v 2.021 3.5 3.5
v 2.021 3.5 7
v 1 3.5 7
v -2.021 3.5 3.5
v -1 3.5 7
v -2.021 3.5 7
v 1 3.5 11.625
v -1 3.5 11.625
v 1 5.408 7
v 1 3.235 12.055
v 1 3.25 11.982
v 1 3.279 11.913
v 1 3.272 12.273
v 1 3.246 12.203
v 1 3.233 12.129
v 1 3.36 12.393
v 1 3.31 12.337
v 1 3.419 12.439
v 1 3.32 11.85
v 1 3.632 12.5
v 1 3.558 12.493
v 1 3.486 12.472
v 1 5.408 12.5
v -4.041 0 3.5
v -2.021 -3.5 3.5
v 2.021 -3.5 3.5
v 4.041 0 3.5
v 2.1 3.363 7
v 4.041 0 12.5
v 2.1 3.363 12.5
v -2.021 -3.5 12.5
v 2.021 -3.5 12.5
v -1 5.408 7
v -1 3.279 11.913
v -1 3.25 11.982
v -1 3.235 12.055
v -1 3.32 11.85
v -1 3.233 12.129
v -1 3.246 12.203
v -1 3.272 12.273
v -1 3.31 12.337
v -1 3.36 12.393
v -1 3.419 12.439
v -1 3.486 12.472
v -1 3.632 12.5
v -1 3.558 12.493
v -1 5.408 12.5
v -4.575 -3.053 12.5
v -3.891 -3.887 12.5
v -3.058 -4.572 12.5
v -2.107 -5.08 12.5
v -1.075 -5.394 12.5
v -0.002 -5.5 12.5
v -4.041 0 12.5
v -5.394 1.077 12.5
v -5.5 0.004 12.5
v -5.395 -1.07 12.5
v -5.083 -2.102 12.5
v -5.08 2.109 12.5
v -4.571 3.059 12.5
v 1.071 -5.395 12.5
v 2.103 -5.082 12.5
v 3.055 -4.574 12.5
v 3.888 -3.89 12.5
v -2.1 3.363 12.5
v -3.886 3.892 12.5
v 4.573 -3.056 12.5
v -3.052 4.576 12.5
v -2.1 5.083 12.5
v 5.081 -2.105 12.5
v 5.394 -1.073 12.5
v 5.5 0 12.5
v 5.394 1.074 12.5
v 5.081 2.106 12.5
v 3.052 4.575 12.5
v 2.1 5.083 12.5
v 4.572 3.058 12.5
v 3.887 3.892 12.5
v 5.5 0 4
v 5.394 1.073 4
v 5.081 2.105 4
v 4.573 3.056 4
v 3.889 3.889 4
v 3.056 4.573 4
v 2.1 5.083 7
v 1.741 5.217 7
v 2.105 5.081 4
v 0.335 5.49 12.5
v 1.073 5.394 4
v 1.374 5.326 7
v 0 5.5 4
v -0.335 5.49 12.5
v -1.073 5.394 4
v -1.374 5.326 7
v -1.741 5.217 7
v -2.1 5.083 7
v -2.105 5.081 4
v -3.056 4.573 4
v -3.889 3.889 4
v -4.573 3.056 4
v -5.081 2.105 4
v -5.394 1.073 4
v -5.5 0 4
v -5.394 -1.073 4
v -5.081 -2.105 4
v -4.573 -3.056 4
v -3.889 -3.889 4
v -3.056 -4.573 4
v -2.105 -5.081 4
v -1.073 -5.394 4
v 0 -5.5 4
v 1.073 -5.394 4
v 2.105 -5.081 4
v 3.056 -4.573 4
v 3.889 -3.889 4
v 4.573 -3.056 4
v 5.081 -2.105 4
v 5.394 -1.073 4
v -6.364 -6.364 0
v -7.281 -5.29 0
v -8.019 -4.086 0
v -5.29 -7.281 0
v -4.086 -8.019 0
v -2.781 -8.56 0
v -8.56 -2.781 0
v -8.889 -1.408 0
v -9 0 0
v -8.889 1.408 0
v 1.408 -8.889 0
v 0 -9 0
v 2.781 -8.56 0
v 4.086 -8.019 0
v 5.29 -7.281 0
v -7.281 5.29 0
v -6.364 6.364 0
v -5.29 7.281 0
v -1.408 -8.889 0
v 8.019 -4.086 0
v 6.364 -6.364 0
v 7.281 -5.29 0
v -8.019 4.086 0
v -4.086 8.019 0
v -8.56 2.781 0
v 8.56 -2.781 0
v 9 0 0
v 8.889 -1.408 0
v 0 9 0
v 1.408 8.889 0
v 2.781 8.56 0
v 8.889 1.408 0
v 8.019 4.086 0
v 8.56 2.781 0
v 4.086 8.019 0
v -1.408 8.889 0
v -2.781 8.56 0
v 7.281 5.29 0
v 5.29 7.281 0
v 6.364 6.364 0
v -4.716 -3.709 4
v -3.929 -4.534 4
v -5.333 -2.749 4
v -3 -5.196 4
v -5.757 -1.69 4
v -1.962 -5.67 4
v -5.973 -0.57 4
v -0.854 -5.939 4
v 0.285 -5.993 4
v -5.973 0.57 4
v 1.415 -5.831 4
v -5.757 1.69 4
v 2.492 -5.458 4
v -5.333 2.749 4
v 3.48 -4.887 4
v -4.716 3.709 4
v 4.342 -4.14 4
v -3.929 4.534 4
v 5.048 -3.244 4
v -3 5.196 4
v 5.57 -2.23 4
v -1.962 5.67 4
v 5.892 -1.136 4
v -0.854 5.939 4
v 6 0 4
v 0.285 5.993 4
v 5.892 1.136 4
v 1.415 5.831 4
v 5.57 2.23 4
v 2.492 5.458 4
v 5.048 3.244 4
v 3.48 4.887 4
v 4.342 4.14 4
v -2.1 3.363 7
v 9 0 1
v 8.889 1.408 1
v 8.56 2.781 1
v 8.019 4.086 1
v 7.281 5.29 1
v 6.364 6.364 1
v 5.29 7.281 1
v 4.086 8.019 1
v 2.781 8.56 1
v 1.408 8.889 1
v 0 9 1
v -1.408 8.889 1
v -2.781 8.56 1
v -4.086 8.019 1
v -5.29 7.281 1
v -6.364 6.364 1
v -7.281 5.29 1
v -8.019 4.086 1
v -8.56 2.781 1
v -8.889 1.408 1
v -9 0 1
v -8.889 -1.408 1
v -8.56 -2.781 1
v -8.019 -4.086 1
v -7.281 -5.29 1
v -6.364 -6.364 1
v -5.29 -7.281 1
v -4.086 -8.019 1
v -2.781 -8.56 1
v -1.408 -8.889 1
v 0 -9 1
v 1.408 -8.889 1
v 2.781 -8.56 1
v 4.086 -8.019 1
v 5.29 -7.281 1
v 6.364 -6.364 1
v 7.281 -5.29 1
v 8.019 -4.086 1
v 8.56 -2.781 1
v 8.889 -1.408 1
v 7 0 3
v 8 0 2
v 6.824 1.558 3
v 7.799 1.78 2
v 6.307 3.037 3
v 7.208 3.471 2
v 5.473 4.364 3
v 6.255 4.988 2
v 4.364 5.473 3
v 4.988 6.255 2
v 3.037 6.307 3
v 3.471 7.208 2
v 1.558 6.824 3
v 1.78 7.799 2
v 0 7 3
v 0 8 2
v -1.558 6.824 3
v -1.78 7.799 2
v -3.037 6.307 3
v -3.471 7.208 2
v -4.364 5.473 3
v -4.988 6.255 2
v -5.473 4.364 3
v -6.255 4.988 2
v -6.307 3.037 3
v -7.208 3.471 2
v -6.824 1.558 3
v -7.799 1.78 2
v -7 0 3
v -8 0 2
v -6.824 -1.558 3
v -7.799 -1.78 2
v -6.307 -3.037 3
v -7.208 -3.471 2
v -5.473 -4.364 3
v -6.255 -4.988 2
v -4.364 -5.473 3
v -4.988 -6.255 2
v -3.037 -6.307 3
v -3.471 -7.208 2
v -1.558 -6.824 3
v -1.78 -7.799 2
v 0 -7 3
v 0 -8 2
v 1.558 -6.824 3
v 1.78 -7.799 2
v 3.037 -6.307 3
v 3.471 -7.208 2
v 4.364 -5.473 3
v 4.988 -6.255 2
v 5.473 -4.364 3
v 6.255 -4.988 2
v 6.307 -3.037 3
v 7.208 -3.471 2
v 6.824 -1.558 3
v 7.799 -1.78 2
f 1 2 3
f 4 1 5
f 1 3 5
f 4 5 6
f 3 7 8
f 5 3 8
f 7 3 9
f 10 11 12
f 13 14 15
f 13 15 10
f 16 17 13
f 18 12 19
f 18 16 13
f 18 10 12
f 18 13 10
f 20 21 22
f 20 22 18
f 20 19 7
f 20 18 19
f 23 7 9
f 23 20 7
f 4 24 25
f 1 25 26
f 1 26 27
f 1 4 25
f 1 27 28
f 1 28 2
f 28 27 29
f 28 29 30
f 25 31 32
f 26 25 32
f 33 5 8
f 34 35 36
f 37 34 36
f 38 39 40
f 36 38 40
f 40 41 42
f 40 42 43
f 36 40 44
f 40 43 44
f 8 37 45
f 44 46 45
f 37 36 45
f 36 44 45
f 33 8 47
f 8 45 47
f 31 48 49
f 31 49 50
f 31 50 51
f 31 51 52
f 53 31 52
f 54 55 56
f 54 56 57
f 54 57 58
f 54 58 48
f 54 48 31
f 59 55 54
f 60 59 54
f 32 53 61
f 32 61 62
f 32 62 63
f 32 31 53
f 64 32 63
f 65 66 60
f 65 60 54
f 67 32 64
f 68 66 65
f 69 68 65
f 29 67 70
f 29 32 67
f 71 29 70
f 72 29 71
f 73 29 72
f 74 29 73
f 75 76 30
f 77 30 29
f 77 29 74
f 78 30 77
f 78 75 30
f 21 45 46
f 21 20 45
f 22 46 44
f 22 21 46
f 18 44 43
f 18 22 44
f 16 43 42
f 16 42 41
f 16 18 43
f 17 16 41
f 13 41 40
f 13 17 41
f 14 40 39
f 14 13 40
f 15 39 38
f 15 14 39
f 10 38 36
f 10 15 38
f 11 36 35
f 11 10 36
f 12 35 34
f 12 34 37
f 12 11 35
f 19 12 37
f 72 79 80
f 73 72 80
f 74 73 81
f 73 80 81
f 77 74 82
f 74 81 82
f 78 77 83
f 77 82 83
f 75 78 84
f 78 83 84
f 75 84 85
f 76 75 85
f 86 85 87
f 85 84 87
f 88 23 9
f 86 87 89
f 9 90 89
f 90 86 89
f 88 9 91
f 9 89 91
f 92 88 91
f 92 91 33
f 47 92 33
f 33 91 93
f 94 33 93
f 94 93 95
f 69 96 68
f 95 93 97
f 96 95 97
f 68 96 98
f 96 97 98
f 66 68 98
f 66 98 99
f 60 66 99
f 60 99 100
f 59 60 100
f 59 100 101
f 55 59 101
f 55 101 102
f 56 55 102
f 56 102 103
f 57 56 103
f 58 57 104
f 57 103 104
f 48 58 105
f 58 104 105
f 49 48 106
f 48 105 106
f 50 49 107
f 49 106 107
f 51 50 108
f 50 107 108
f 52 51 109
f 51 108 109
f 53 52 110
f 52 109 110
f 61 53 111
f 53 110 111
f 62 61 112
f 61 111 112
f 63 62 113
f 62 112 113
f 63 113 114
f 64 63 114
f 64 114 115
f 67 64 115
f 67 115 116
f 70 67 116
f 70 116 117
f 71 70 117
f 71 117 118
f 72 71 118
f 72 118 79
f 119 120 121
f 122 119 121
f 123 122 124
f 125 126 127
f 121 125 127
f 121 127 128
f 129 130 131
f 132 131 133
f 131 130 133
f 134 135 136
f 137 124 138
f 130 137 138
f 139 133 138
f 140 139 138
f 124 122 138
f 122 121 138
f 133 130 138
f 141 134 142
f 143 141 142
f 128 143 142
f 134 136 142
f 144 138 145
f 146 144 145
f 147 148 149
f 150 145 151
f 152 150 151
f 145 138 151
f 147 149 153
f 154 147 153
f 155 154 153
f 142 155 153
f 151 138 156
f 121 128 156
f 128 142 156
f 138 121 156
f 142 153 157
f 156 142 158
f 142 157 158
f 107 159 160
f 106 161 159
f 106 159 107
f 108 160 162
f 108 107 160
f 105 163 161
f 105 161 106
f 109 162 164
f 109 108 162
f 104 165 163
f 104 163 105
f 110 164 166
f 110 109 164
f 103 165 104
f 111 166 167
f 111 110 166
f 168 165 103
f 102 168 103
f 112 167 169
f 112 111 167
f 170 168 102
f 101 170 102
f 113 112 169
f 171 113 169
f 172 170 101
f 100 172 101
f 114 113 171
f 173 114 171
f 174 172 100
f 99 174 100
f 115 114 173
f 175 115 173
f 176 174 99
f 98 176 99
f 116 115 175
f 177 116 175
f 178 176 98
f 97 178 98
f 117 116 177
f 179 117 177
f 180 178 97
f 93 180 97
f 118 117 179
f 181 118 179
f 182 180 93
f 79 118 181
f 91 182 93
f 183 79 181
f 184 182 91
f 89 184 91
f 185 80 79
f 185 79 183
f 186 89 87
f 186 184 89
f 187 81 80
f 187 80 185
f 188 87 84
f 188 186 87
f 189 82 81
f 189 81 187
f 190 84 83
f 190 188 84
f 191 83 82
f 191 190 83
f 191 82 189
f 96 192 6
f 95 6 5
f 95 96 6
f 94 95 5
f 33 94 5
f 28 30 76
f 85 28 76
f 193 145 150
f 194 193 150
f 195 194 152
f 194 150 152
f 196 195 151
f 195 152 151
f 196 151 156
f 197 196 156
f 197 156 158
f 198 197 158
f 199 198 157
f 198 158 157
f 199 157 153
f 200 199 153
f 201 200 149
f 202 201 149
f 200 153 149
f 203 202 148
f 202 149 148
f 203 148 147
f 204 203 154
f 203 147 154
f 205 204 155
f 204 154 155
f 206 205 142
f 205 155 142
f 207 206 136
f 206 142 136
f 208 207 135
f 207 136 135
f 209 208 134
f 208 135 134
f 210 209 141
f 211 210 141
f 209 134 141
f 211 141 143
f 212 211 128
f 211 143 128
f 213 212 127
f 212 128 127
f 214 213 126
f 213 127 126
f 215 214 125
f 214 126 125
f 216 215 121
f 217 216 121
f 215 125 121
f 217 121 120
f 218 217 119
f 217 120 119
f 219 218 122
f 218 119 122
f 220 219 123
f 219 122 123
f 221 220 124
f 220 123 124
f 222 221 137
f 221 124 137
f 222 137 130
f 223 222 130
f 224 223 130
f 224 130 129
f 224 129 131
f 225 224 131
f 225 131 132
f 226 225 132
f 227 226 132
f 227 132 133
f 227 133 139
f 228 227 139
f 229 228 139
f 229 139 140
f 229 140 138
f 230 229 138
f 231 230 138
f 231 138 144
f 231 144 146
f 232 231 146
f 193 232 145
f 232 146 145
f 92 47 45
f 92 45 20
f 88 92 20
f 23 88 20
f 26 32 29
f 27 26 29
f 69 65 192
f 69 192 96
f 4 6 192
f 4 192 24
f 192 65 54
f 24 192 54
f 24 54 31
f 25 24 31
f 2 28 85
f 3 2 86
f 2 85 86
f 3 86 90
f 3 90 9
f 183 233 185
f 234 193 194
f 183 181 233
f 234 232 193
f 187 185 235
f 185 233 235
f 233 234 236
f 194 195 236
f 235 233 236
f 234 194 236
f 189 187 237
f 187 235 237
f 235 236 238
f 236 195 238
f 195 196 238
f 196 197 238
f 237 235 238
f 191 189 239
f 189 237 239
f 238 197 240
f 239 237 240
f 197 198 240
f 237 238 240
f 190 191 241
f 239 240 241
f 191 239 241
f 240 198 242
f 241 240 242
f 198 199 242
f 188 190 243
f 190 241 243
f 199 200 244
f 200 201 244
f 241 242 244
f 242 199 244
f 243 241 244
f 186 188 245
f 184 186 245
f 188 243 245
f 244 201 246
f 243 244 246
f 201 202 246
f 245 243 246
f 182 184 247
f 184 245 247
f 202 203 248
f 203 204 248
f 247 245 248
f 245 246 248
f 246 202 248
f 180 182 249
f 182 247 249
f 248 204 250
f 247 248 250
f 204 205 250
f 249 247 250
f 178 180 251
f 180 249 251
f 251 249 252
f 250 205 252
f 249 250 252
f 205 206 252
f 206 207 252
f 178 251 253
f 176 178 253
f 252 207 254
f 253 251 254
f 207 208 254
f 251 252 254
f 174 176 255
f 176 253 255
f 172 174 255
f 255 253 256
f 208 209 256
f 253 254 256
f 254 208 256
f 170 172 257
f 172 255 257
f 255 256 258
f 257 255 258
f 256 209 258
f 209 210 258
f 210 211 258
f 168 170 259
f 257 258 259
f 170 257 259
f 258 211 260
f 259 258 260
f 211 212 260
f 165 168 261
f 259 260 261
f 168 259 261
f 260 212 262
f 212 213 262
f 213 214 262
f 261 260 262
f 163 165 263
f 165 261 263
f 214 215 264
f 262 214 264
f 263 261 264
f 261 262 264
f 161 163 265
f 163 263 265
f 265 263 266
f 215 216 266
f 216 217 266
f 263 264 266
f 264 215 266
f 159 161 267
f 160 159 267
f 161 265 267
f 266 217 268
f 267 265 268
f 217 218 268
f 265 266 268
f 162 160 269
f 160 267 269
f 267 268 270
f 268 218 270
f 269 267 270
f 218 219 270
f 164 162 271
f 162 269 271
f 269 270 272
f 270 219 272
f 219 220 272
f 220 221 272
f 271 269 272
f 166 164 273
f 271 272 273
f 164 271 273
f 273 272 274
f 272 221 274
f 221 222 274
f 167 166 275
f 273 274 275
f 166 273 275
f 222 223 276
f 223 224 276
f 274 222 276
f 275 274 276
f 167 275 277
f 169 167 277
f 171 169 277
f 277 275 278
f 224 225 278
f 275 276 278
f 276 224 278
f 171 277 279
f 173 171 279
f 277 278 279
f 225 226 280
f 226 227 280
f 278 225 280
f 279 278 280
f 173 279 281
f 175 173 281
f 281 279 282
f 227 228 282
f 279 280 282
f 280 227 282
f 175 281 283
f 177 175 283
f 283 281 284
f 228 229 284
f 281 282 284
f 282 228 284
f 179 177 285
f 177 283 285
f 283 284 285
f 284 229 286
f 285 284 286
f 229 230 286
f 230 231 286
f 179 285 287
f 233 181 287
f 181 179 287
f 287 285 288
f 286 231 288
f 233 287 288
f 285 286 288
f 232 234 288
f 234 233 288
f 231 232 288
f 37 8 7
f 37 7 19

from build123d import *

# Parameters (mm, degrees)
SKETCH_R          = 9
PAD_DEPTH         = 4
SKETCH001_R       = 5.5
PAD001_DEPTH      = 8.5
POCKET_DEPTH      = 9
SKETCH003_W       = 1.1
SKETCH003_H       = 4.61522
POCKET001_DEPTH   = 5.5
PAD002_DEPTH      = 1
PAD002_DEPTH_BACK = 1
FILLET_R          = 0.4
CHAMFER_SIZE      = 3


with BuildPart() as part:
    # Sketch (on XY_Plane of Origin) → Pad (new body)
    with BuildSketch(Plane.XY):
        Circle(SKETCH_R)
    extrude(amount=PAD_DEPTH)

    # Sketch001 (on Face3 of Pad) → Pad001 (join)
    with BuildSketch(Plane.XY.offset(4)):
        Circle(SKETCH001_R)
    extrude(amount=PAD001_DEPTH)

    # Sketch002 (on Face5 of Pad001) → Pocket (cut)
    with BuildSketch(Plane.XY.offset(12.5)):
        Polygon((2.020726, 3.5), (-2.020726, 3.5), (-4.041452, 0), (-2.020726, -3.5), (2.020726, -3.5), (4.041452, 0), align=None)
    extrude(amount=-POCKET_DEPTH, mode=Mode.SUBTRACT)

    # Sketch003 (on Face5 of Pocket) → Pocket001 (cut)
    with BuildSketch(Plane.XY.offset(12.5)):
        with Locations((-1.55, 4.391028)):
            Rectangle(SKETCH003_W, SKETCH003_H)
    pocket001 = extrude(amount=-POCKET001_DEPTH, mode=Mode.SUBTRACT)

    # Mirrored: Pocket001 across Sketch003 V_Axis
    add(pocket001.mirror(Plane(origin=(0, 0, 12.5), x_dir=(0, 0, 1), z_dir=(1, 0, 0))), mode=Mode.SUBTRACT)

    # Sketch004 (on YZ_Plane of Origin) → Pad002 (join, two sides)
    with BuildSketch(Plane.YZ) as pad002_sk:
        Polygon((3.6, 12.5), (3.6, 11.5), (2.8, 12.5), align=None)
    extrude(amount=PAD002_DEPTH)
    extrude(pad002_sk.sketch, amount=-PAD002_DEPTH_BACK)

    # Fillet
    fillet_edges = [part.edges().sort_by_distance(p)[0] for p in [
        (0, 2.8, 12.5),
    ]]
    fillet(fillet_edges, radius=FILLET_R)

    # Chamfer
    chamfer_edges = [part.edges().sort_by_distance(p)[0] for p in [
        (-9, 0, 4),
    ]]
    chamfer(chamfer_edges, length=CHAMFER_SIZE)


solid = part.part
